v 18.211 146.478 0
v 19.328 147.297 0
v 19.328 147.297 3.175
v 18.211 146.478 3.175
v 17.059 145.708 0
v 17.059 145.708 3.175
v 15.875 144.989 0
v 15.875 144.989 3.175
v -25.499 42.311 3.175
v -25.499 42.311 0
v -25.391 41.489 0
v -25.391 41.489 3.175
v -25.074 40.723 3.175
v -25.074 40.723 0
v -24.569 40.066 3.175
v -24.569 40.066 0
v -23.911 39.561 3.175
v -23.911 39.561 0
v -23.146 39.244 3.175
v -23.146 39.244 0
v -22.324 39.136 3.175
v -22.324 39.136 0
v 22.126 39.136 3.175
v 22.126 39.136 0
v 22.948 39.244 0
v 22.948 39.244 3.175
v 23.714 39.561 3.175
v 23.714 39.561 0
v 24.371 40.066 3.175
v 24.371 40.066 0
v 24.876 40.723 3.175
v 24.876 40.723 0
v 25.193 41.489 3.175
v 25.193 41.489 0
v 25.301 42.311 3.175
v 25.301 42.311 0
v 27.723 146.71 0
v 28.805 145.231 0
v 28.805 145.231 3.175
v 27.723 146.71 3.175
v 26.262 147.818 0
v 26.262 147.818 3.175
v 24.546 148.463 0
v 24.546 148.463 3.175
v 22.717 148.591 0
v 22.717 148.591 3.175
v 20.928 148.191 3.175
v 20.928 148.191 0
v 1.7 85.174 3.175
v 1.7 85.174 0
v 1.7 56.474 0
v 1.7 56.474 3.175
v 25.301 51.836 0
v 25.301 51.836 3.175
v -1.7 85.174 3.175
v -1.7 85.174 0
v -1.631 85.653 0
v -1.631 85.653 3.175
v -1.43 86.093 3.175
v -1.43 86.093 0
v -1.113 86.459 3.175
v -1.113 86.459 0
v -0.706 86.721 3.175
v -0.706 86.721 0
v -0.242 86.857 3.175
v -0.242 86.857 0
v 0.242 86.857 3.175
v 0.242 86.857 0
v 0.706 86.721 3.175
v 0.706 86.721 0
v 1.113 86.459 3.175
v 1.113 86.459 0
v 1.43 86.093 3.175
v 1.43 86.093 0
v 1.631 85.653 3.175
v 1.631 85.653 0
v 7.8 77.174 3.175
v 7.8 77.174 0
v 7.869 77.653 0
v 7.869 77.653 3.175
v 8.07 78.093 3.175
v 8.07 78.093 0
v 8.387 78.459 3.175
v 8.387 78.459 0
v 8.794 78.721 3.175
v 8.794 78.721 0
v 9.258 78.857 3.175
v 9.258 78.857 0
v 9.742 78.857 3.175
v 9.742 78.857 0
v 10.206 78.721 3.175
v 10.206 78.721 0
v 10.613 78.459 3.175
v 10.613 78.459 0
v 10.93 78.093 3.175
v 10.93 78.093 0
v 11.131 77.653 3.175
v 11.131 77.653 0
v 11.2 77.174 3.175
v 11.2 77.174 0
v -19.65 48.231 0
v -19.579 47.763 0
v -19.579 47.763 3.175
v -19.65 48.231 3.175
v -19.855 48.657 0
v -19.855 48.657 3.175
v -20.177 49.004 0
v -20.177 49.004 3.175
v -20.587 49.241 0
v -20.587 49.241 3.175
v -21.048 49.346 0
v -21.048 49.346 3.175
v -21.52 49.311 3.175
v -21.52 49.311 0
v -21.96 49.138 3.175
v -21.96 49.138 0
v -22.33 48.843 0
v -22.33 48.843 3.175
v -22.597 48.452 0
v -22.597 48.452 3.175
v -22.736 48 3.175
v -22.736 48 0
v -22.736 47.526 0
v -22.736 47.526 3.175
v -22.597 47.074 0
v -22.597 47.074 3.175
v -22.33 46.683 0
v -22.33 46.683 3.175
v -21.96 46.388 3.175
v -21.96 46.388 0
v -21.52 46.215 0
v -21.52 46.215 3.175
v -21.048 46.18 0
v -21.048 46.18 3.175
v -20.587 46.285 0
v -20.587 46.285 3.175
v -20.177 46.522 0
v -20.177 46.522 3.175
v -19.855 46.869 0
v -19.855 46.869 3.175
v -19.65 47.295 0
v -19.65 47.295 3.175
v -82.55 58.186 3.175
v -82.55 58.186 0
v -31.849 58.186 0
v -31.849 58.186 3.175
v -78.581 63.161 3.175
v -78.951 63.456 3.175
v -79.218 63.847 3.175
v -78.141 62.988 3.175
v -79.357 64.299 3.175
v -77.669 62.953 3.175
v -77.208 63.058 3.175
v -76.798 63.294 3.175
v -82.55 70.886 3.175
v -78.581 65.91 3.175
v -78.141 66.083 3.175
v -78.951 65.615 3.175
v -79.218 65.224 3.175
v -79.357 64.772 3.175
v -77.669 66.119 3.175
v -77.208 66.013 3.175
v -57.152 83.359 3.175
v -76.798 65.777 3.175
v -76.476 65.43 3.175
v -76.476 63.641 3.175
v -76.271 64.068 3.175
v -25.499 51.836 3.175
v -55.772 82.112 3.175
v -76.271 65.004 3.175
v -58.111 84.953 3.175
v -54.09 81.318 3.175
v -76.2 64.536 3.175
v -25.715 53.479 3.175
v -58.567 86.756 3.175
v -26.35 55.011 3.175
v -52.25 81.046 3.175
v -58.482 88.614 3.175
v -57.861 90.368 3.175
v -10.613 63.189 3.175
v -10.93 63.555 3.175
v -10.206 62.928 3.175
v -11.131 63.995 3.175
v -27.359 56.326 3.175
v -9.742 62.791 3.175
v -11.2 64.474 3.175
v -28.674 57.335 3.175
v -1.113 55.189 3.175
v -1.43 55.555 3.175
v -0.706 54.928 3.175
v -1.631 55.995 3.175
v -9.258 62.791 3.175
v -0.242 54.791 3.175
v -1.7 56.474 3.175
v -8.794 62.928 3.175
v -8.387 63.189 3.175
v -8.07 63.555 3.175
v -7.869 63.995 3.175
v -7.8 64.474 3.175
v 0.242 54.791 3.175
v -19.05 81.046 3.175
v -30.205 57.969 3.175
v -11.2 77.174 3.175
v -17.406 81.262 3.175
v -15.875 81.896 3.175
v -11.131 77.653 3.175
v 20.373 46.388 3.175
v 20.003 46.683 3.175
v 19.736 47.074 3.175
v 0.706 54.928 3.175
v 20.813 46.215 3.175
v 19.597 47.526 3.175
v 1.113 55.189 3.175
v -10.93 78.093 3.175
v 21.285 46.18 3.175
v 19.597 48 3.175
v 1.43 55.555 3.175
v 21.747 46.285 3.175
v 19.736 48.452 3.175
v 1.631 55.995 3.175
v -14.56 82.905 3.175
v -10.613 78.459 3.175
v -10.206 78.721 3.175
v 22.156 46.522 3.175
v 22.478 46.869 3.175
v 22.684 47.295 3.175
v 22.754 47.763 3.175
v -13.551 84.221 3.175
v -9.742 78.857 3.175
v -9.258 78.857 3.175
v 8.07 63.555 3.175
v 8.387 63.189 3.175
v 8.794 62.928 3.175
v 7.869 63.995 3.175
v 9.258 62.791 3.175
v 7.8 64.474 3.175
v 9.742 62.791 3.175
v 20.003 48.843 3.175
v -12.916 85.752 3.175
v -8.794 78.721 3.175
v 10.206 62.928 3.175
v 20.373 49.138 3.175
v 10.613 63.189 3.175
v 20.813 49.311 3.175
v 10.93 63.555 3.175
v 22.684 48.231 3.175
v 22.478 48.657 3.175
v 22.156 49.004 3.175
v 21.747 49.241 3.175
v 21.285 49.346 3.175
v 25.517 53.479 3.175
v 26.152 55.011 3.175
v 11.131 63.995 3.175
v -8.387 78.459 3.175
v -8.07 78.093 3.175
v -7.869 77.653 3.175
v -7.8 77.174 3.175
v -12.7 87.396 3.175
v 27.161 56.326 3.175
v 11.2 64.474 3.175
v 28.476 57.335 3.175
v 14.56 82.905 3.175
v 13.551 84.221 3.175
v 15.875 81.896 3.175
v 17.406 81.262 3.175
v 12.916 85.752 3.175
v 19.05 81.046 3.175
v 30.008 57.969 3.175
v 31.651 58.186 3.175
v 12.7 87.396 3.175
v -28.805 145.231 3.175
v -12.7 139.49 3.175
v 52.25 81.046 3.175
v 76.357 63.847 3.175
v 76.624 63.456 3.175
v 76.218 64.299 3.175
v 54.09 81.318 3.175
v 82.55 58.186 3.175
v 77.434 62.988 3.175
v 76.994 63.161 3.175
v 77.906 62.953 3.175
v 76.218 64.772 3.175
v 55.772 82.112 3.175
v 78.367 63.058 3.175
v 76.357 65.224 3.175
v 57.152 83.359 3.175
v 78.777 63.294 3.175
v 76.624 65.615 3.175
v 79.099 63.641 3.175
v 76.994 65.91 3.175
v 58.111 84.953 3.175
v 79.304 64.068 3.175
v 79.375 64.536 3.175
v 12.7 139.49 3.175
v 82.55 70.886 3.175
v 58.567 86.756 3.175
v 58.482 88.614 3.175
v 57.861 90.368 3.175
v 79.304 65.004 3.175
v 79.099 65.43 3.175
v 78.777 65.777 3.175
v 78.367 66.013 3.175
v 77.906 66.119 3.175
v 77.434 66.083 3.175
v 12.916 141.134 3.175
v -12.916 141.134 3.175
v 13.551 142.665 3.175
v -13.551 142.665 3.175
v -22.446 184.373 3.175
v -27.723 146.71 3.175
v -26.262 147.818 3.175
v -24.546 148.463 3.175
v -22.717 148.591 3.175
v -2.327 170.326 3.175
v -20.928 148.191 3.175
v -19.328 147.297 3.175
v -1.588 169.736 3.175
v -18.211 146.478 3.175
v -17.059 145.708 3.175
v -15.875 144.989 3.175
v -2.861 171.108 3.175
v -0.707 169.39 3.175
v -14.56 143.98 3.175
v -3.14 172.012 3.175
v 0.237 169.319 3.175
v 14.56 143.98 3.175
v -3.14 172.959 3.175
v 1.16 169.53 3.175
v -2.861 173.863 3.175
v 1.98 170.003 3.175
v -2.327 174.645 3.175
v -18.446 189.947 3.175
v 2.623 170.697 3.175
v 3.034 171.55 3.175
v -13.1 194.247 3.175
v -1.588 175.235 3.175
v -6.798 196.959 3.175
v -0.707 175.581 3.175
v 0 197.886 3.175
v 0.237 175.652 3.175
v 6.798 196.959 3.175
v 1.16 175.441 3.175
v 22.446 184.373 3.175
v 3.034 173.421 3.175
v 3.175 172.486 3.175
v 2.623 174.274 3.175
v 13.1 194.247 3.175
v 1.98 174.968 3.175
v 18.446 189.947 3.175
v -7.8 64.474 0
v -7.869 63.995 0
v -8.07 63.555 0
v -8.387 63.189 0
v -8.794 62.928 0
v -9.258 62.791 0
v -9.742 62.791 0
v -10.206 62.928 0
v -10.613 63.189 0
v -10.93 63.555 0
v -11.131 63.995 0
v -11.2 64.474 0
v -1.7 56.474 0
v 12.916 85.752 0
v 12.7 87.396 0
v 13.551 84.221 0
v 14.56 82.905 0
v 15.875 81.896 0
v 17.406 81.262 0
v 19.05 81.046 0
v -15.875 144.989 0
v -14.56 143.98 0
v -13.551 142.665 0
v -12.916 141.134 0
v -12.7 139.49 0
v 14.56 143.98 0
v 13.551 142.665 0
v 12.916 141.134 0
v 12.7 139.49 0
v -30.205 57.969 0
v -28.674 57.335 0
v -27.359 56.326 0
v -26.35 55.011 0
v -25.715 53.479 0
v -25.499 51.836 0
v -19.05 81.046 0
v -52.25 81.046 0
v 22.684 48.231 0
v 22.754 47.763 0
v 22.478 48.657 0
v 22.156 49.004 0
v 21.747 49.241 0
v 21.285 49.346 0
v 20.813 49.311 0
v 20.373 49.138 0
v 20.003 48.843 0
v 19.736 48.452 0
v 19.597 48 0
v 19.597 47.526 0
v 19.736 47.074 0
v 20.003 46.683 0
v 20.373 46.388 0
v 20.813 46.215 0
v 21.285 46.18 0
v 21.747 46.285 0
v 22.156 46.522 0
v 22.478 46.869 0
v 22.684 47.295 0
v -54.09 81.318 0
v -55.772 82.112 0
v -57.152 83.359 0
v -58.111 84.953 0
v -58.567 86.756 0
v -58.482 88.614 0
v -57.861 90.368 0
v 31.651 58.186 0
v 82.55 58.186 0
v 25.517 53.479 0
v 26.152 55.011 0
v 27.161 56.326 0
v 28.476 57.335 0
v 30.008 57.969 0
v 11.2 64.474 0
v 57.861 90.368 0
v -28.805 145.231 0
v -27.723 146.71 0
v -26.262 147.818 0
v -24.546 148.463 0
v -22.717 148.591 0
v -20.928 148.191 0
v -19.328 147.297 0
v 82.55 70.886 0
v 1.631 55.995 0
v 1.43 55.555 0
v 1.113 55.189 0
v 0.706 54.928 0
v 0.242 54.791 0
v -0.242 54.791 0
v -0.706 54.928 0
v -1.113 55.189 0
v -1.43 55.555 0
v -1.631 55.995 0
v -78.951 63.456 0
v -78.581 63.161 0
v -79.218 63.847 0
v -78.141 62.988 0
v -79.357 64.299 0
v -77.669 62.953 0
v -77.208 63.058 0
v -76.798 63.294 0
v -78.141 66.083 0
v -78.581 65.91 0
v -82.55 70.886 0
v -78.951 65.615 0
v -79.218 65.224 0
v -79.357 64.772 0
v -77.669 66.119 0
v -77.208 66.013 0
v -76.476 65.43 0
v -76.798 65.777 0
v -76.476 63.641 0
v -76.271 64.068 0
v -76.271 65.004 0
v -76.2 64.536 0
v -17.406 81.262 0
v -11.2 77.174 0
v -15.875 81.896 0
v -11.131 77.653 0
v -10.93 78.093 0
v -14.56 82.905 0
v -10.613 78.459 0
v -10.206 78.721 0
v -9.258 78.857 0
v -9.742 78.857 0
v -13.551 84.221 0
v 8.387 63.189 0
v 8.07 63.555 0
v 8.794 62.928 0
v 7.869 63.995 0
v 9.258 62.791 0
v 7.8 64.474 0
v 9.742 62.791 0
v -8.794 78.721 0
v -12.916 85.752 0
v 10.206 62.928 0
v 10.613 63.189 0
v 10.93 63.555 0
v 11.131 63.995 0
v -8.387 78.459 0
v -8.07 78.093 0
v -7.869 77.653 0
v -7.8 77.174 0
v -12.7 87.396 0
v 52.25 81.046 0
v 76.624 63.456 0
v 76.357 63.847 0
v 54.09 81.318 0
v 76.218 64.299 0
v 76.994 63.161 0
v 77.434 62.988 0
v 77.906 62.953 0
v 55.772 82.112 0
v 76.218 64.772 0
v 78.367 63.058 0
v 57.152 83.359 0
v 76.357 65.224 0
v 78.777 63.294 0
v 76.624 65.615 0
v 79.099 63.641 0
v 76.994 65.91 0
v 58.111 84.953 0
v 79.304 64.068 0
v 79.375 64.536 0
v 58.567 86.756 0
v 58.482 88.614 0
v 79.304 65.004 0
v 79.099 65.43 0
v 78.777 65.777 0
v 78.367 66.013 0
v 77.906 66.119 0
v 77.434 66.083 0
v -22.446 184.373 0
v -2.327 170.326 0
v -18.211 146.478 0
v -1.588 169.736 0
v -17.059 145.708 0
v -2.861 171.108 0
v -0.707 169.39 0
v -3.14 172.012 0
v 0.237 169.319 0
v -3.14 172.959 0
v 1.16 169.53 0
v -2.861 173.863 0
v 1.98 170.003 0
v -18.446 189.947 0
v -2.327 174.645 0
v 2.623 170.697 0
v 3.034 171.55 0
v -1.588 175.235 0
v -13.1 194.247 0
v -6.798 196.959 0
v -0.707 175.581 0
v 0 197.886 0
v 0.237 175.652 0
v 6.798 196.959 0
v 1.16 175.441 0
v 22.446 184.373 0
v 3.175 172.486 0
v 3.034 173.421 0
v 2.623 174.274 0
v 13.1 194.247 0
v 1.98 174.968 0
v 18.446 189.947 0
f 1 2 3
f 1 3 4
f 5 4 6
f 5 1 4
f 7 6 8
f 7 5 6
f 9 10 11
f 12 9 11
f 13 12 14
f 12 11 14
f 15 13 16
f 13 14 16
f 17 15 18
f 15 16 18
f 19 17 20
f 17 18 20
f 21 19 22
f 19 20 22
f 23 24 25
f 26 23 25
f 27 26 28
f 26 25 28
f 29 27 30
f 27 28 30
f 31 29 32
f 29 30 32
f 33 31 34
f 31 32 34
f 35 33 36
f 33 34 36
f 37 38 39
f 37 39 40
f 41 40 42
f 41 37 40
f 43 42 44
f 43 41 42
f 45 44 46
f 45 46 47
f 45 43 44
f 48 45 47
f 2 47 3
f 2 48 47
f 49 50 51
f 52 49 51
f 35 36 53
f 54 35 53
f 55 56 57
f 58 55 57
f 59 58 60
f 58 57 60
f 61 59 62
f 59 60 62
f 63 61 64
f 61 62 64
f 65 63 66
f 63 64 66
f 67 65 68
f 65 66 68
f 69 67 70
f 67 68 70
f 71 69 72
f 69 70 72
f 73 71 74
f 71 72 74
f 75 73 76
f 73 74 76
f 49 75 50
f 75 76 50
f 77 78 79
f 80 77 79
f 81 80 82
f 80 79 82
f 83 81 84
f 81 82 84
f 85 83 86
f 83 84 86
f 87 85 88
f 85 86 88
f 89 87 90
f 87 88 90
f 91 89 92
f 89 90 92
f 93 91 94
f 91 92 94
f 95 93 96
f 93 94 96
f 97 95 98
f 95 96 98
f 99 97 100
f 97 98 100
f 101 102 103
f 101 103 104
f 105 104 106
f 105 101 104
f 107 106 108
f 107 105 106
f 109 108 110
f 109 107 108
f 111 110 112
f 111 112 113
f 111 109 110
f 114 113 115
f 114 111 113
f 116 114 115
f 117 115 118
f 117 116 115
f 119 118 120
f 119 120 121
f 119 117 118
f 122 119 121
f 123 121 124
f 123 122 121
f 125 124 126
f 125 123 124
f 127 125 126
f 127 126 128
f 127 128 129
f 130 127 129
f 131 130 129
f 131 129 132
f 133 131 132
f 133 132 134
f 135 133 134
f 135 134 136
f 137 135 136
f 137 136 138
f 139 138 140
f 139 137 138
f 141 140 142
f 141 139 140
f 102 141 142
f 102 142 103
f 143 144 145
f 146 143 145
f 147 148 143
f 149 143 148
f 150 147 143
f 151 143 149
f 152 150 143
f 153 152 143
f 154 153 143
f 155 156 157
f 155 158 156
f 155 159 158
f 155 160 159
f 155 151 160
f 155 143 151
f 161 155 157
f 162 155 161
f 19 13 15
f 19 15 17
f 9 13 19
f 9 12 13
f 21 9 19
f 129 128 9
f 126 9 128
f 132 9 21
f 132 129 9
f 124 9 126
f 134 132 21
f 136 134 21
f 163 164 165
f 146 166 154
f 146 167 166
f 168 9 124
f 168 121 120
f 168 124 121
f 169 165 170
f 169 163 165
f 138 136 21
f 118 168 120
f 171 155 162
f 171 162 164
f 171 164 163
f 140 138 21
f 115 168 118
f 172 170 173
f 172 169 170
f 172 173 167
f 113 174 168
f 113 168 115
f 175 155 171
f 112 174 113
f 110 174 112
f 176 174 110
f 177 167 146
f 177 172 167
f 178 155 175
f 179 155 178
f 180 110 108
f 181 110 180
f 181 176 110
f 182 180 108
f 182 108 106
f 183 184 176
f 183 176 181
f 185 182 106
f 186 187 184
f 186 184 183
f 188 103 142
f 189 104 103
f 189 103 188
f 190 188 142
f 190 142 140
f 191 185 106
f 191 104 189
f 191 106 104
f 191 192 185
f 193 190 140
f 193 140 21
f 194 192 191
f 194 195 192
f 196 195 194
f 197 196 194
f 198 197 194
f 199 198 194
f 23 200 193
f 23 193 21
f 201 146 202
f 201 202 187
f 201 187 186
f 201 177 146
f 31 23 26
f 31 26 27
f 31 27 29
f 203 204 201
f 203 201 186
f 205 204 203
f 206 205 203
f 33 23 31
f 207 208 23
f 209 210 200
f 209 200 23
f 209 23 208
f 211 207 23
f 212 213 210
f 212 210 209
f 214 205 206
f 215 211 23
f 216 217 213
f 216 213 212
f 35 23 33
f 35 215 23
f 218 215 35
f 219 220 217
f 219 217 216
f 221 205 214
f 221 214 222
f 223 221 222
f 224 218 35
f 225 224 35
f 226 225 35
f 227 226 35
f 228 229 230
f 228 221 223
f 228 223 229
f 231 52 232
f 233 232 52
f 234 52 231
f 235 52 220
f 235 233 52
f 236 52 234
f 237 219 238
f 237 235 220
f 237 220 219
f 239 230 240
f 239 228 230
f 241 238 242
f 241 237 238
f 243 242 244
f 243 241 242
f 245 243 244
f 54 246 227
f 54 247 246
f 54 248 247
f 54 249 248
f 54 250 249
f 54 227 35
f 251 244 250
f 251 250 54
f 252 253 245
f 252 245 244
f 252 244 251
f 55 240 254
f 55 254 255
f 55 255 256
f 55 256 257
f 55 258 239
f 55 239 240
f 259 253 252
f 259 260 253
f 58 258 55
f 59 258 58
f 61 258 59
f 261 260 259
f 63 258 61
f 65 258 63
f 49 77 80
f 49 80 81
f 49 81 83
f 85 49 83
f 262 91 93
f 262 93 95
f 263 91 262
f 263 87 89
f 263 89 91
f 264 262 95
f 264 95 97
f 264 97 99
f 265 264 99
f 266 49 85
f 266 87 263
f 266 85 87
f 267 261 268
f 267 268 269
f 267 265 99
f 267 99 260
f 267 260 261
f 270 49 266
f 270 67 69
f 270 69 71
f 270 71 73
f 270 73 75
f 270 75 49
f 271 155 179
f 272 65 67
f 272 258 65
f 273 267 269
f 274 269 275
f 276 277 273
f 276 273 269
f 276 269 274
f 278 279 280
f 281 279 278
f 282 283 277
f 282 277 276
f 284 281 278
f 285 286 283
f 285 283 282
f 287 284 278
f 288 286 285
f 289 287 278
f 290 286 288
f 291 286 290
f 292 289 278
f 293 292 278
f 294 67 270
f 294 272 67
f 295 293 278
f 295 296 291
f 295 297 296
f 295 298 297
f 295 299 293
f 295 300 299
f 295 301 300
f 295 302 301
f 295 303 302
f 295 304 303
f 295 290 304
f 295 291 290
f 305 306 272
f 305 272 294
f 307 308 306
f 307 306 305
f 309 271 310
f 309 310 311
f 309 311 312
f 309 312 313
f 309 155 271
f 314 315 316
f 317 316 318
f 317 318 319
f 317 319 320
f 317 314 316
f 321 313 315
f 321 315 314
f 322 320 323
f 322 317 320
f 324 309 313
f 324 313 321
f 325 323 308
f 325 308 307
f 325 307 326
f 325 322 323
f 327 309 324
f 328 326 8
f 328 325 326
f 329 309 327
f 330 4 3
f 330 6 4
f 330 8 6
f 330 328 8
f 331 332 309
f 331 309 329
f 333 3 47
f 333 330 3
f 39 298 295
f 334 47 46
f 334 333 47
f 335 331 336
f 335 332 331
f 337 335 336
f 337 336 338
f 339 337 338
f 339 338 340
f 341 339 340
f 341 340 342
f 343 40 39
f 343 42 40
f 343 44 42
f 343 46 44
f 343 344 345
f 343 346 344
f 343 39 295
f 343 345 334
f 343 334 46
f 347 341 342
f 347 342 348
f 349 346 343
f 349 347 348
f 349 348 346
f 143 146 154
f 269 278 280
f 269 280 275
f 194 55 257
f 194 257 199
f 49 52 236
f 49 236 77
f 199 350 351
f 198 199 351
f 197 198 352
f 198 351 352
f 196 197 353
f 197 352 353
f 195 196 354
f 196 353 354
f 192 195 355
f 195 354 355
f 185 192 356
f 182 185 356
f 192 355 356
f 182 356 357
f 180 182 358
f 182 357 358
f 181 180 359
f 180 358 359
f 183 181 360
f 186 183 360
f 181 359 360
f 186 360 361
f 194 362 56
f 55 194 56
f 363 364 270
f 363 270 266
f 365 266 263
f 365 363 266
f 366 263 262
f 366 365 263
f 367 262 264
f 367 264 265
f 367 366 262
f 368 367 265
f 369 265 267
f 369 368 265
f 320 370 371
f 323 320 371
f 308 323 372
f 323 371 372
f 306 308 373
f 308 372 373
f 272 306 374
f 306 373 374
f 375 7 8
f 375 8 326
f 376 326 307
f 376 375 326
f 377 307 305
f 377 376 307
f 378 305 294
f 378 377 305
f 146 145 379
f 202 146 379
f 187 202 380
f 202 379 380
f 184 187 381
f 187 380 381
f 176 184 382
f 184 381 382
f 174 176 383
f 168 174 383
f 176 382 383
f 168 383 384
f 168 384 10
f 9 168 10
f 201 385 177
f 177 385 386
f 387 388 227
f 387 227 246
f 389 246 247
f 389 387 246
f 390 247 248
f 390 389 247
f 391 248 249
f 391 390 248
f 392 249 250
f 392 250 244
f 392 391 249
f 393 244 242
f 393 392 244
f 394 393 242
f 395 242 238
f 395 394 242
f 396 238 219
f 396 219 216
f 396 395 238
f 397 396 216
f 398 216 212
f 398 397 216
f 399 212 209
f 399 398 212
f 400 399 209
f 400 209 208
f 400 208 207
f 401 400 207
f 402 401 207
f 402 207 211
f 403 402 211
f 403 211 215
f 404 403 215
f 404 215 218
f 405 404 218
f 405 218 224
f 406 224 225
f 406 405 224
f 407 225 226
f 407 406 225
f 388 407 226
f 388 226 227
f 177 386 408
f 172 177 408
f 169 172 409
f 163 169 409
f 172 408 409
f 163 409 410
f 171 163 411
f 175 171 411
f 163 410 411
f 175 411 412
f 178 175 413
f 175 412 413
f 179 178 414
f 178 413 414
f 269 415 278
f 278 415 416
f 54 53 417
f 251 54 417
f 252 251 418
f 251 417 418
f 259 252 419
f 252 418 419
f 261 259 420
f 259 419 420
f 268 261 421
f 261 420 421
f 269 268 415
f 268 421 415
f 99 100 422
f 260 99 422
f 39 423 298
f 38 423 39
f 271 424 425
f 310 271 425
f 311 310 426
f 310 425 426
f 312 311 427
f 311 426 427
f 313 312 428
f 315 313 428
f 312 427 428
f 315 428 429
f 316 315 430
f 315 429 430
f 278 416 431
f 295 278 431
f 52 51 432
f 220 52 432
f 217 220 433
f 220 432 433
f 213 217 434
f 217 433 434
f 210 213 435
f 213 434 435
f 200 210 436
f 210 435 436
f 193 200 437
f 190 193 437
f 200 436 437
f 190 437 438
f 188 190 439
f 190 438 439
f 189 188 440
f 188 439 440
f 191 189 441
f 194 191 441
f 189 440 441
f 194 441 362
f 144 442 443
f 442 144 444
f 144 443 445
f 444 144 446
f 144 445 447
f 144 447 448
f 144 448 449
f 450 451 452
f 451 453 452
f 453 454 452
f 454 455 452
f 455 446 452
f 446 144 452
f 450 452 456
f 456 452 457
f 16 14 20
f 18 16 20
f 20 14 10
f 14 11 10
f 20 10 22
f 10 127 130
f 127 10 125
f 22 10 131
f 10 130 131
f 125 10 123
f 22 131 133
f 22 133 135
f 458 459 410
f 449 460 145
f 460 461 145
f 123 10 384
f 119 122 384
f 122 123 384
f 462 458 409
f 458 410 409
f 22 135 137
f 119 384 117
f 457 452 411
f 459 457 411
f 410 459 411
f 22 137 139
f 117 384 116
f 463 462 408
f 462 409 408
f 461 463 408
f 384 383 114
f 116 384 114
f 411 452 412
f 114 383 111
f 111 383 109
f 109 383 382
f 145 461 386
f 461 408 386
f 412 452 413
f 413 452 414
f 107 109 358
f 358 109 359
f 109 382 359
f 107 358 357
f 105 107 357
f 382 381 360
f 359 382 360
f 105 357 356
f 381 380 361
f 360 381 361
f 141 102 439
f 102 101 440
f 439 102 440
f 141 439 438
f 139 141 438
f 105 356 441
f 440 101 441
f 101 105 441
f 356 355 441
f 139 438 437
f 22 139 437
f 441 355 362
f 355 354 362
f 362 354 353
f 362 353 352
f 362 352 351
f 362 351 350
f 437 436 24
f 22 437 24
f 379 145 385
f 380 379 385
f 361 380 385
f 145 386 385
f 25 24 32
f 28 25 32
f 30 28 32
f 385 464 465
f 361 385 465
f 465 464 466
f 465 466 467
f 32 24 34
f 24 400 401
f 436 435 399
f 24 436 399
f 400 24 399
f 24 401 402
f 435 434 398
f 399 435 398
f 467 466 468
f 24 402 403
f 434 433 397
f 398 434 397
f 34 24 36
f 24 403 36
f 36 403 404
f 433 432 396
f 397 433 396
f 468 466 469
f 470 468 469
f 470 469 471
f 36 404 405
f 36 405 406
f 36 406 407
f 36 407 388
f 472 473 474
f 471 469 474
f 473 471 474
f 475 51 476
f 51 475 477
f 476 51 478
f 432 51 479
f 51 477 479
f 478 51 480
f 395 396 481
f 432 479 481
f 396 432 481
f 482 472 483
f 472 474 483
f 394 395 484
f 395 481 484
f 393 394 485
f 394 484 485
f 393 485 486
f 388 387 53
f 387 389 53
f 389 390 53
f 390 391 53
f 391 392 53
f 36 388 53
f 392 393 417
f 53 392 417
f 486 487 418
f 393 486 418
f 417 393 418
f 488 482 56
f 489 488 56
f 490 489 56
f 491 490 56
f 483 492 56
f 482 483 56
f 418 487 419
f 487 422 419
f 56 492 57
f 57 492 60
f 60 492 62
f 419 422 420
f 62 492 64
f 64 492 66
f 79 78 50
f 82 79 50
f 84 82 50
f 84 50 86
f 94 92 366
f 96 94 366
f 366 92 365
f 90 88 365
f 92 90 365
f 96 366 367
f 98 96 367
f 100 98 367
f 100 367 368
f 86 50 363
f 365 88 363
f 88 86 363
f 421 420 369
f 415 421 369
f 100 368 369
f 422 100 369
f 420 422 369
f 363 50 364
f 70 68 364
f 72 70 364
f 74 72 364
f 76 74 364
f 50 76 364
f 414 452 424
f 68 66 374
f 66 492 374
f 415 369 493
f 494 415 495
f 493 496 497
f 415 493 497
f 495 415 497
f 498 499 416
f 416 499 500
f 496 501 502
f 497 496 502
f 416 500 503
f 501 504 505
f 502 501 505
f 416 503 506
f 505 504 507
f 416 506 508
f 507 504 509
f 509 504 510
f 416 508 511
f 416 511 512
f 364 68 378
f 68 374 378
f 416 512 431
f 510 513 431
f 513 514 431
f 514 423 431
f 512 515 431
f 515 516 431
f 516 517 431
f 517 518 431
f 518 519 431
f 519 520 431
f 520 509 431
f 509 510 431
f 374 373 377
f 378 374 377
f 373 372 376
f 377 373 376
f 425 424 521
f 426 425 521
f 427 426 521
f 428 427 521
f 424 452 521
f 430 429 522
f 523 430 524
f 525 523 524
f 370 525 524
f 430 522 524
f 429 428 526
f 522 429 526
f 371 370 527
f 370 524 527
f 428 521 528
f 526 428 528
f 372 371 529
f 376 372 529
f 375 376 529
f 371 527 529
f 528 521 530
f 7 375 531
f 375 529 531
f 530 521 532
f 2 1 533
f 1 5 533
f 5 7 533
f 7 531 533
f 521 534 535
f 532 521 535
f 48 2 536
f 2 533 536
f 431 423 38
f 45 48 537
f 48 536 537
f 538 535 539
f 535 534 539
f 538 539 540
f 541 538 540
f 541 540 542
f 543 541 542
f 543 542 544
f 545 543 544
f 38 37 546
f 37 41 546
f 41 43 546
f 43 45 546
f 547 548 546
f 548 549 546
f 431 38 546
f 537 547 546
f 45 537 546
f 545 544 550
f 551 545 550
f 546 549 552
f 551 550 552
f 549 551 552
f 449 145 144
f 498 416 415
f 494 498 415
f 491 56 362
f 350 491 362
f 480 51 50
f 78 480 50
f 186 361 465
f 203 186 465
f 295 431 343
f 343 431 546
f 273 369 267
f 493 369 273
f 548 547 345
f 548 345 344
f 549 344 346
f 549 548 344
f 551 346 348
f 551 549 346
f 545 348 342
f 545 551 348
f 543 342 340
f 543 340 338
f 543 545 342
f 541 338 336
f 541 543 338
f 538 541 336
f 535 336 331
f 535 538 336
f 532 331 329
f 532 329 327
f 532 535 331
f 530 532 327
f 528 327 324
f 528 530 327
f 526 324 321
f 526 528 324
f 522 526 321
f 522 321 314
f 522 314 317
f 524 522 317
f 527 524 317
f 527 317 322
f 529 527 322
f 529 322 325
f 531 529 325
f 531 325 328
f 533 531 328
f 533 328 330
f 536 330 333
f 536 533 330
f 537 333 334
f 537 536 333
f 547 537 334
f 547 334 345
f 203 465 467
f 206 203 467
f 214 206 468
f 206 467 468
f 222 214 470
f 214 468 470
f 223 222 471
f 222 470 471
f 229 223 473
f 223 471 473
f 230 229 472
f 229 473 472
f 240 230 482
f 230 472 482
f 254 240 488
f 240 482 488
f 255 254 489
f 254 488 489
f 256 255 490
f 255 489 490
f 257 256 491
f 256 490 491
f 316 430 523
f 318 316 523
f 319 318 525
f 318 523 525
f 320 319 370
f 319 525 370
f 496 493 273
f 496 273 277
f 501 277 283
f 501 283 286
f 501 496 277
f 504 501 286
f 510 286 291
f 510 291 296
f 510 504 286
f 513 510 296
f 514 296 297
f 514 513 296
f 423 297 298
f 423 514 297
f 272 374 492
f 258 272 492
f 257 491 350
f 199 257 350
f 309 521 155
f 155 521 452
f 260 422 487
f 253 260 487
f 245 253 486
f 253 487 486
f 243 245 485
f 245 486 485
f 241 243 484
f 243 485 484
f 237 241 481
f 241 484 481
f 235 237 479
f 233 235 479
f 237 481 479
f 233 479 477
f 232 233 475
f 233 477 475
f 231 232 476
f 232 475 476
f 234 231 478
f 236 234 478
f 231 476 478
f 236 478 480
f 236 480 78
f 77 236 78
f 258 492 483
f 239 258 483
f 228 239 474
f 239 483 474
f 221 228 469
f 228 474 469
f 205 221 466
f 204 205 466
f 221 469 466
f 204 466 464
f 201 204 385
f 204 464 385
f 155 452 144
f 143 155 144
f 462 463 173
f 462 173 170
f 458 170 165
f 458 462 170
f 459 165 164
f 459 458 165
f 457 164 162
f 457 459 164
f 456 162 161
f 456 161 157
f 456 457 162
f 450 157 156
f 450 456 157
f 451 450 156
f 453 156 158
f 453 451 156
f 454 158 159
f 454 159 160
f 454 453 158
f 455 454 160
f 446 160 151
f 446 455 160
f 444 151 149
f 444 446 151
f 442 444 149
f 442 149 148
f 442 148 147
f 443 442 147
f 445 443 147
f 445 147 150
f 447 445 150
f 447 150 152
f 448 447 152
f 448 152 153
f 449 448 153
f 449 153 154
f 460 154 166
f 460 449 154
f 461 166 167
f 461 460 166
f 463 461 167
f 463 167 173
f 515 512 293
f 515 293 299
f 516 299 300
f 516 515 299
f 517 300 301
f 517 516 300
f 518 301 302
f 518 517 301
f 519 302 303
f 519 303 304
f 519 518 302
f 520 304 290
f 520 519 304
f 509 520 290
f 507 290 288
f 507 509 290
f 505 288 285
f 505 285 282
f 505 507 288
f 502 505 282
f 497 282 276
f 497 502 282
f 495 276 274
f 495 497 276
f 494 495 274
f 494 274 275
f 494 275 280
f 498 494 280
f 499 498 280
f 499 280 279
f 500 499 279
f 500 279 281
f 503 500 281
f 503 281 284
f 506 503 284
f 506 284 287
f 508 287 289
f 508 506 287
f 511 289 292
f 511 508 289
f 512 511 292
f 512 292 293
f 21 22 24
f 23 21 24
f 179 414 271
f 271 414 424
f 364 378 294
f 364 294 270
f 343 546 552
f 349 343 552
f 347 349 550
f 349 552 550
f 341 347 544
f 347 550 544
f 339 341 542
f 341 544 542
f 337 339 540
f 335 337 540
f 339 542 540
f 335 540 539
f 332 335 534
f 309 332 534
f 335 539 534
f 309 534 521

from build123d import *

# Parameters (mm, degrees)
SKETCH5_R           = 1.5875
SKETCH5_R_2         = 3.175
BOSS_EXTRUDE2_DEPTH = 3.175


with BuildPart() as part:
    # Sketch5 → Boss-Extrude2 (new body)
    with BuildSketch(Plane.XY):
        with BuildLine():
            Line((-82.55, 70.885609673), (-82.55, 58.185609673))
            Line((-82.55, 58.185609673), (-31.848963051, 58.185609673))
            ThreePointArc((-31.848963051, 58.185609673), (-27.35883499, 56.325737733), (-25.498963051, 51.835609673))
            Line((-25.498963051, 51.835609673), (-25.498963051, 42.310609673))
            ThreePointArc((-25.498963051, 42.310609673), (-24.569027081, 40.065545642), (-22.323963051, 39.135609673))
            Line((-22.323963051, 39.135609673), (22.126036949, 39.135609673))
            ThreePointArc((22.126036949, 39.135609673), (24.37110098, 40.065545642), (25.301036949, 42.310609673))
            Line((25.301036949, 42.310609673), (25.301036949, 51.835609673))
            ThreePointArc((25.301036949, 51.835609673), (27.160908889, 56.325737733), (31.651036949, 58.185609673))
            Line((31.651036949, 58.185609673), (82.55, 58.185609673))
            Line((82.55, 58.185609673), (82.55, 70.885609673))
            Line((82.55, 70.885609673), (22.446426721, 184.373331383))
            ThreePointArc((22.446426721, 184.373331383), (0, 197.885609673), (-22.446426721, 184.373331383))
            Line((-22.446426721, 184.373331383), (-82.55, 70.885609673))
        make_face()
        with Locations((-77.7875, 64.535609673)):
            Circle(SKETCH5_R, mode=Mode.SUBTRACT)
        with Locations((77.7875, 64.535609673)):
            Circle(SKETCH5_R, mode=Mode.SUBTRACT)
        with Locations((-21.166666667, 47.762966307)):
            Circle(SKETCH5_R, mode=Mode.SUBTRACT)
        with Locations((21.166666667, 47.762966307)):
            Circle(SKETCH5_R, mode=Mode.SUBTRACT)
        with Locations((0, 172.485609673)):
            Circle(SKETCH5_R_2, mode=Mode.SUBTRACT)
        with BuildLine():
            Line((-57.861180964, 90.3675401), (-28.80539088, 145.230757697))
            ThreePointArc((-28.80539088, 145.230757697), (-24.546211379, 148.463135508), (-19.3281535, 147.296624336))
            ThreePointArc((-19.3281535, 147.296624336), (-17.639343437, 146.086441824), (-15.875, 144.989303103))
            ThreePointArc((-15.875, 144.989303103), (-13.550738686, 142.665041789), (-12.7, 139.490041789))
            Line((-12.7, 139.490041789), (-12.7, 87.395609673))
            ThreePointArc((-12.7, 87.395609673), (-14.559871939, 82.905481612), (-19.05, 81.045609673))
            Line((-19.05, 81.045609673), (-52.249574284, 81.045609673))
            ThreePointArc((-52.249574284, 81.045609673), (-57.689898641, 84.120648468), (-57.861180964, 90.3675401))
        make_face(mode=Mode.SUBTRACT)
        with BuildLine():
            Line((57.861180964, 90.3675401), (28.80539088, 145.230757697))
            ThreePointArc((28.80539088, 145.230757697), (24.546211379, 148.463135508), (19.3281535, 147.296624336))
            ThreePointArc((19.3281535, 147.296624336), (17.639343437, 146.086441824), (15.875, 144.989303103))
            ThreePointArc((15.875, 144.989303103), (13.550738686, 142.665041789), (12.7, 139.490041789))
            Line((12.7, 139.490041789), (12.7, 87.395609673))
            ThreePointArc((12.7, 87.395609673), (14.559871939, 82.905481612), (19.05, 81.045609673))
            Line((19.05, 81.045609673), (52.249574284, 81.045609673))
            ThreePointArc((52.249574284, 81.045609673), (57.689898641, 84.120648468), (57.861180964, 90.3675401))
        make_face(mode=Mode.SUBTRACT)
        with BuildLine():
            Line((-11.2, 64.474125728), (-11.2, 77.174125728))
            ThreePointArc((-11.2, 77.174125728), (-9.5, 78.874125728), (-7.8, 77.174125728))
            Line((-7.8, 77.174125728), (-7.8, 64.474125728))
            ThreePointArc((-7.8, 64.474125728), (-9.5, 62.774125728), (-11.2, 64.474125728))
        make_face(mode=Mode.SUBTRACT)
        with BuildLine():
            Line((-1.7, 56.474125728), (-1.7, 85.174125728))
            ThreePointArc((-1.7, 85.174125728), (0, 86.874125728), (1.7, 85.174125728))
            Line((1.7, 85.174125728), (1.7, 56.474125728))
            ThreePointArc((1.7, 56.474125728), (0, 54.774125728), (-1.7, 56.474125728))
        make_face(mode=Mode.SUBTRACT)
        with BuildLine():
            Line((7.8, 64.474125728), (7.8, 77.174125728))
            ThreePointArc((7.8, 77.174125728), (9.5, 78.874125728), (11.2, 77.174125728))
            Line((11.2, 77.174125728), (11.2, 64.474125728))
            ThreePointArc((11.2, 64.474125728), (9.5, 62.774125728), (7.8, 64.474125728))
        make_face(mode=Mode.SUBTRACT)
    extrude(amount=BOSS_EXTRUDE2_DEPTH)


solid = part.part
